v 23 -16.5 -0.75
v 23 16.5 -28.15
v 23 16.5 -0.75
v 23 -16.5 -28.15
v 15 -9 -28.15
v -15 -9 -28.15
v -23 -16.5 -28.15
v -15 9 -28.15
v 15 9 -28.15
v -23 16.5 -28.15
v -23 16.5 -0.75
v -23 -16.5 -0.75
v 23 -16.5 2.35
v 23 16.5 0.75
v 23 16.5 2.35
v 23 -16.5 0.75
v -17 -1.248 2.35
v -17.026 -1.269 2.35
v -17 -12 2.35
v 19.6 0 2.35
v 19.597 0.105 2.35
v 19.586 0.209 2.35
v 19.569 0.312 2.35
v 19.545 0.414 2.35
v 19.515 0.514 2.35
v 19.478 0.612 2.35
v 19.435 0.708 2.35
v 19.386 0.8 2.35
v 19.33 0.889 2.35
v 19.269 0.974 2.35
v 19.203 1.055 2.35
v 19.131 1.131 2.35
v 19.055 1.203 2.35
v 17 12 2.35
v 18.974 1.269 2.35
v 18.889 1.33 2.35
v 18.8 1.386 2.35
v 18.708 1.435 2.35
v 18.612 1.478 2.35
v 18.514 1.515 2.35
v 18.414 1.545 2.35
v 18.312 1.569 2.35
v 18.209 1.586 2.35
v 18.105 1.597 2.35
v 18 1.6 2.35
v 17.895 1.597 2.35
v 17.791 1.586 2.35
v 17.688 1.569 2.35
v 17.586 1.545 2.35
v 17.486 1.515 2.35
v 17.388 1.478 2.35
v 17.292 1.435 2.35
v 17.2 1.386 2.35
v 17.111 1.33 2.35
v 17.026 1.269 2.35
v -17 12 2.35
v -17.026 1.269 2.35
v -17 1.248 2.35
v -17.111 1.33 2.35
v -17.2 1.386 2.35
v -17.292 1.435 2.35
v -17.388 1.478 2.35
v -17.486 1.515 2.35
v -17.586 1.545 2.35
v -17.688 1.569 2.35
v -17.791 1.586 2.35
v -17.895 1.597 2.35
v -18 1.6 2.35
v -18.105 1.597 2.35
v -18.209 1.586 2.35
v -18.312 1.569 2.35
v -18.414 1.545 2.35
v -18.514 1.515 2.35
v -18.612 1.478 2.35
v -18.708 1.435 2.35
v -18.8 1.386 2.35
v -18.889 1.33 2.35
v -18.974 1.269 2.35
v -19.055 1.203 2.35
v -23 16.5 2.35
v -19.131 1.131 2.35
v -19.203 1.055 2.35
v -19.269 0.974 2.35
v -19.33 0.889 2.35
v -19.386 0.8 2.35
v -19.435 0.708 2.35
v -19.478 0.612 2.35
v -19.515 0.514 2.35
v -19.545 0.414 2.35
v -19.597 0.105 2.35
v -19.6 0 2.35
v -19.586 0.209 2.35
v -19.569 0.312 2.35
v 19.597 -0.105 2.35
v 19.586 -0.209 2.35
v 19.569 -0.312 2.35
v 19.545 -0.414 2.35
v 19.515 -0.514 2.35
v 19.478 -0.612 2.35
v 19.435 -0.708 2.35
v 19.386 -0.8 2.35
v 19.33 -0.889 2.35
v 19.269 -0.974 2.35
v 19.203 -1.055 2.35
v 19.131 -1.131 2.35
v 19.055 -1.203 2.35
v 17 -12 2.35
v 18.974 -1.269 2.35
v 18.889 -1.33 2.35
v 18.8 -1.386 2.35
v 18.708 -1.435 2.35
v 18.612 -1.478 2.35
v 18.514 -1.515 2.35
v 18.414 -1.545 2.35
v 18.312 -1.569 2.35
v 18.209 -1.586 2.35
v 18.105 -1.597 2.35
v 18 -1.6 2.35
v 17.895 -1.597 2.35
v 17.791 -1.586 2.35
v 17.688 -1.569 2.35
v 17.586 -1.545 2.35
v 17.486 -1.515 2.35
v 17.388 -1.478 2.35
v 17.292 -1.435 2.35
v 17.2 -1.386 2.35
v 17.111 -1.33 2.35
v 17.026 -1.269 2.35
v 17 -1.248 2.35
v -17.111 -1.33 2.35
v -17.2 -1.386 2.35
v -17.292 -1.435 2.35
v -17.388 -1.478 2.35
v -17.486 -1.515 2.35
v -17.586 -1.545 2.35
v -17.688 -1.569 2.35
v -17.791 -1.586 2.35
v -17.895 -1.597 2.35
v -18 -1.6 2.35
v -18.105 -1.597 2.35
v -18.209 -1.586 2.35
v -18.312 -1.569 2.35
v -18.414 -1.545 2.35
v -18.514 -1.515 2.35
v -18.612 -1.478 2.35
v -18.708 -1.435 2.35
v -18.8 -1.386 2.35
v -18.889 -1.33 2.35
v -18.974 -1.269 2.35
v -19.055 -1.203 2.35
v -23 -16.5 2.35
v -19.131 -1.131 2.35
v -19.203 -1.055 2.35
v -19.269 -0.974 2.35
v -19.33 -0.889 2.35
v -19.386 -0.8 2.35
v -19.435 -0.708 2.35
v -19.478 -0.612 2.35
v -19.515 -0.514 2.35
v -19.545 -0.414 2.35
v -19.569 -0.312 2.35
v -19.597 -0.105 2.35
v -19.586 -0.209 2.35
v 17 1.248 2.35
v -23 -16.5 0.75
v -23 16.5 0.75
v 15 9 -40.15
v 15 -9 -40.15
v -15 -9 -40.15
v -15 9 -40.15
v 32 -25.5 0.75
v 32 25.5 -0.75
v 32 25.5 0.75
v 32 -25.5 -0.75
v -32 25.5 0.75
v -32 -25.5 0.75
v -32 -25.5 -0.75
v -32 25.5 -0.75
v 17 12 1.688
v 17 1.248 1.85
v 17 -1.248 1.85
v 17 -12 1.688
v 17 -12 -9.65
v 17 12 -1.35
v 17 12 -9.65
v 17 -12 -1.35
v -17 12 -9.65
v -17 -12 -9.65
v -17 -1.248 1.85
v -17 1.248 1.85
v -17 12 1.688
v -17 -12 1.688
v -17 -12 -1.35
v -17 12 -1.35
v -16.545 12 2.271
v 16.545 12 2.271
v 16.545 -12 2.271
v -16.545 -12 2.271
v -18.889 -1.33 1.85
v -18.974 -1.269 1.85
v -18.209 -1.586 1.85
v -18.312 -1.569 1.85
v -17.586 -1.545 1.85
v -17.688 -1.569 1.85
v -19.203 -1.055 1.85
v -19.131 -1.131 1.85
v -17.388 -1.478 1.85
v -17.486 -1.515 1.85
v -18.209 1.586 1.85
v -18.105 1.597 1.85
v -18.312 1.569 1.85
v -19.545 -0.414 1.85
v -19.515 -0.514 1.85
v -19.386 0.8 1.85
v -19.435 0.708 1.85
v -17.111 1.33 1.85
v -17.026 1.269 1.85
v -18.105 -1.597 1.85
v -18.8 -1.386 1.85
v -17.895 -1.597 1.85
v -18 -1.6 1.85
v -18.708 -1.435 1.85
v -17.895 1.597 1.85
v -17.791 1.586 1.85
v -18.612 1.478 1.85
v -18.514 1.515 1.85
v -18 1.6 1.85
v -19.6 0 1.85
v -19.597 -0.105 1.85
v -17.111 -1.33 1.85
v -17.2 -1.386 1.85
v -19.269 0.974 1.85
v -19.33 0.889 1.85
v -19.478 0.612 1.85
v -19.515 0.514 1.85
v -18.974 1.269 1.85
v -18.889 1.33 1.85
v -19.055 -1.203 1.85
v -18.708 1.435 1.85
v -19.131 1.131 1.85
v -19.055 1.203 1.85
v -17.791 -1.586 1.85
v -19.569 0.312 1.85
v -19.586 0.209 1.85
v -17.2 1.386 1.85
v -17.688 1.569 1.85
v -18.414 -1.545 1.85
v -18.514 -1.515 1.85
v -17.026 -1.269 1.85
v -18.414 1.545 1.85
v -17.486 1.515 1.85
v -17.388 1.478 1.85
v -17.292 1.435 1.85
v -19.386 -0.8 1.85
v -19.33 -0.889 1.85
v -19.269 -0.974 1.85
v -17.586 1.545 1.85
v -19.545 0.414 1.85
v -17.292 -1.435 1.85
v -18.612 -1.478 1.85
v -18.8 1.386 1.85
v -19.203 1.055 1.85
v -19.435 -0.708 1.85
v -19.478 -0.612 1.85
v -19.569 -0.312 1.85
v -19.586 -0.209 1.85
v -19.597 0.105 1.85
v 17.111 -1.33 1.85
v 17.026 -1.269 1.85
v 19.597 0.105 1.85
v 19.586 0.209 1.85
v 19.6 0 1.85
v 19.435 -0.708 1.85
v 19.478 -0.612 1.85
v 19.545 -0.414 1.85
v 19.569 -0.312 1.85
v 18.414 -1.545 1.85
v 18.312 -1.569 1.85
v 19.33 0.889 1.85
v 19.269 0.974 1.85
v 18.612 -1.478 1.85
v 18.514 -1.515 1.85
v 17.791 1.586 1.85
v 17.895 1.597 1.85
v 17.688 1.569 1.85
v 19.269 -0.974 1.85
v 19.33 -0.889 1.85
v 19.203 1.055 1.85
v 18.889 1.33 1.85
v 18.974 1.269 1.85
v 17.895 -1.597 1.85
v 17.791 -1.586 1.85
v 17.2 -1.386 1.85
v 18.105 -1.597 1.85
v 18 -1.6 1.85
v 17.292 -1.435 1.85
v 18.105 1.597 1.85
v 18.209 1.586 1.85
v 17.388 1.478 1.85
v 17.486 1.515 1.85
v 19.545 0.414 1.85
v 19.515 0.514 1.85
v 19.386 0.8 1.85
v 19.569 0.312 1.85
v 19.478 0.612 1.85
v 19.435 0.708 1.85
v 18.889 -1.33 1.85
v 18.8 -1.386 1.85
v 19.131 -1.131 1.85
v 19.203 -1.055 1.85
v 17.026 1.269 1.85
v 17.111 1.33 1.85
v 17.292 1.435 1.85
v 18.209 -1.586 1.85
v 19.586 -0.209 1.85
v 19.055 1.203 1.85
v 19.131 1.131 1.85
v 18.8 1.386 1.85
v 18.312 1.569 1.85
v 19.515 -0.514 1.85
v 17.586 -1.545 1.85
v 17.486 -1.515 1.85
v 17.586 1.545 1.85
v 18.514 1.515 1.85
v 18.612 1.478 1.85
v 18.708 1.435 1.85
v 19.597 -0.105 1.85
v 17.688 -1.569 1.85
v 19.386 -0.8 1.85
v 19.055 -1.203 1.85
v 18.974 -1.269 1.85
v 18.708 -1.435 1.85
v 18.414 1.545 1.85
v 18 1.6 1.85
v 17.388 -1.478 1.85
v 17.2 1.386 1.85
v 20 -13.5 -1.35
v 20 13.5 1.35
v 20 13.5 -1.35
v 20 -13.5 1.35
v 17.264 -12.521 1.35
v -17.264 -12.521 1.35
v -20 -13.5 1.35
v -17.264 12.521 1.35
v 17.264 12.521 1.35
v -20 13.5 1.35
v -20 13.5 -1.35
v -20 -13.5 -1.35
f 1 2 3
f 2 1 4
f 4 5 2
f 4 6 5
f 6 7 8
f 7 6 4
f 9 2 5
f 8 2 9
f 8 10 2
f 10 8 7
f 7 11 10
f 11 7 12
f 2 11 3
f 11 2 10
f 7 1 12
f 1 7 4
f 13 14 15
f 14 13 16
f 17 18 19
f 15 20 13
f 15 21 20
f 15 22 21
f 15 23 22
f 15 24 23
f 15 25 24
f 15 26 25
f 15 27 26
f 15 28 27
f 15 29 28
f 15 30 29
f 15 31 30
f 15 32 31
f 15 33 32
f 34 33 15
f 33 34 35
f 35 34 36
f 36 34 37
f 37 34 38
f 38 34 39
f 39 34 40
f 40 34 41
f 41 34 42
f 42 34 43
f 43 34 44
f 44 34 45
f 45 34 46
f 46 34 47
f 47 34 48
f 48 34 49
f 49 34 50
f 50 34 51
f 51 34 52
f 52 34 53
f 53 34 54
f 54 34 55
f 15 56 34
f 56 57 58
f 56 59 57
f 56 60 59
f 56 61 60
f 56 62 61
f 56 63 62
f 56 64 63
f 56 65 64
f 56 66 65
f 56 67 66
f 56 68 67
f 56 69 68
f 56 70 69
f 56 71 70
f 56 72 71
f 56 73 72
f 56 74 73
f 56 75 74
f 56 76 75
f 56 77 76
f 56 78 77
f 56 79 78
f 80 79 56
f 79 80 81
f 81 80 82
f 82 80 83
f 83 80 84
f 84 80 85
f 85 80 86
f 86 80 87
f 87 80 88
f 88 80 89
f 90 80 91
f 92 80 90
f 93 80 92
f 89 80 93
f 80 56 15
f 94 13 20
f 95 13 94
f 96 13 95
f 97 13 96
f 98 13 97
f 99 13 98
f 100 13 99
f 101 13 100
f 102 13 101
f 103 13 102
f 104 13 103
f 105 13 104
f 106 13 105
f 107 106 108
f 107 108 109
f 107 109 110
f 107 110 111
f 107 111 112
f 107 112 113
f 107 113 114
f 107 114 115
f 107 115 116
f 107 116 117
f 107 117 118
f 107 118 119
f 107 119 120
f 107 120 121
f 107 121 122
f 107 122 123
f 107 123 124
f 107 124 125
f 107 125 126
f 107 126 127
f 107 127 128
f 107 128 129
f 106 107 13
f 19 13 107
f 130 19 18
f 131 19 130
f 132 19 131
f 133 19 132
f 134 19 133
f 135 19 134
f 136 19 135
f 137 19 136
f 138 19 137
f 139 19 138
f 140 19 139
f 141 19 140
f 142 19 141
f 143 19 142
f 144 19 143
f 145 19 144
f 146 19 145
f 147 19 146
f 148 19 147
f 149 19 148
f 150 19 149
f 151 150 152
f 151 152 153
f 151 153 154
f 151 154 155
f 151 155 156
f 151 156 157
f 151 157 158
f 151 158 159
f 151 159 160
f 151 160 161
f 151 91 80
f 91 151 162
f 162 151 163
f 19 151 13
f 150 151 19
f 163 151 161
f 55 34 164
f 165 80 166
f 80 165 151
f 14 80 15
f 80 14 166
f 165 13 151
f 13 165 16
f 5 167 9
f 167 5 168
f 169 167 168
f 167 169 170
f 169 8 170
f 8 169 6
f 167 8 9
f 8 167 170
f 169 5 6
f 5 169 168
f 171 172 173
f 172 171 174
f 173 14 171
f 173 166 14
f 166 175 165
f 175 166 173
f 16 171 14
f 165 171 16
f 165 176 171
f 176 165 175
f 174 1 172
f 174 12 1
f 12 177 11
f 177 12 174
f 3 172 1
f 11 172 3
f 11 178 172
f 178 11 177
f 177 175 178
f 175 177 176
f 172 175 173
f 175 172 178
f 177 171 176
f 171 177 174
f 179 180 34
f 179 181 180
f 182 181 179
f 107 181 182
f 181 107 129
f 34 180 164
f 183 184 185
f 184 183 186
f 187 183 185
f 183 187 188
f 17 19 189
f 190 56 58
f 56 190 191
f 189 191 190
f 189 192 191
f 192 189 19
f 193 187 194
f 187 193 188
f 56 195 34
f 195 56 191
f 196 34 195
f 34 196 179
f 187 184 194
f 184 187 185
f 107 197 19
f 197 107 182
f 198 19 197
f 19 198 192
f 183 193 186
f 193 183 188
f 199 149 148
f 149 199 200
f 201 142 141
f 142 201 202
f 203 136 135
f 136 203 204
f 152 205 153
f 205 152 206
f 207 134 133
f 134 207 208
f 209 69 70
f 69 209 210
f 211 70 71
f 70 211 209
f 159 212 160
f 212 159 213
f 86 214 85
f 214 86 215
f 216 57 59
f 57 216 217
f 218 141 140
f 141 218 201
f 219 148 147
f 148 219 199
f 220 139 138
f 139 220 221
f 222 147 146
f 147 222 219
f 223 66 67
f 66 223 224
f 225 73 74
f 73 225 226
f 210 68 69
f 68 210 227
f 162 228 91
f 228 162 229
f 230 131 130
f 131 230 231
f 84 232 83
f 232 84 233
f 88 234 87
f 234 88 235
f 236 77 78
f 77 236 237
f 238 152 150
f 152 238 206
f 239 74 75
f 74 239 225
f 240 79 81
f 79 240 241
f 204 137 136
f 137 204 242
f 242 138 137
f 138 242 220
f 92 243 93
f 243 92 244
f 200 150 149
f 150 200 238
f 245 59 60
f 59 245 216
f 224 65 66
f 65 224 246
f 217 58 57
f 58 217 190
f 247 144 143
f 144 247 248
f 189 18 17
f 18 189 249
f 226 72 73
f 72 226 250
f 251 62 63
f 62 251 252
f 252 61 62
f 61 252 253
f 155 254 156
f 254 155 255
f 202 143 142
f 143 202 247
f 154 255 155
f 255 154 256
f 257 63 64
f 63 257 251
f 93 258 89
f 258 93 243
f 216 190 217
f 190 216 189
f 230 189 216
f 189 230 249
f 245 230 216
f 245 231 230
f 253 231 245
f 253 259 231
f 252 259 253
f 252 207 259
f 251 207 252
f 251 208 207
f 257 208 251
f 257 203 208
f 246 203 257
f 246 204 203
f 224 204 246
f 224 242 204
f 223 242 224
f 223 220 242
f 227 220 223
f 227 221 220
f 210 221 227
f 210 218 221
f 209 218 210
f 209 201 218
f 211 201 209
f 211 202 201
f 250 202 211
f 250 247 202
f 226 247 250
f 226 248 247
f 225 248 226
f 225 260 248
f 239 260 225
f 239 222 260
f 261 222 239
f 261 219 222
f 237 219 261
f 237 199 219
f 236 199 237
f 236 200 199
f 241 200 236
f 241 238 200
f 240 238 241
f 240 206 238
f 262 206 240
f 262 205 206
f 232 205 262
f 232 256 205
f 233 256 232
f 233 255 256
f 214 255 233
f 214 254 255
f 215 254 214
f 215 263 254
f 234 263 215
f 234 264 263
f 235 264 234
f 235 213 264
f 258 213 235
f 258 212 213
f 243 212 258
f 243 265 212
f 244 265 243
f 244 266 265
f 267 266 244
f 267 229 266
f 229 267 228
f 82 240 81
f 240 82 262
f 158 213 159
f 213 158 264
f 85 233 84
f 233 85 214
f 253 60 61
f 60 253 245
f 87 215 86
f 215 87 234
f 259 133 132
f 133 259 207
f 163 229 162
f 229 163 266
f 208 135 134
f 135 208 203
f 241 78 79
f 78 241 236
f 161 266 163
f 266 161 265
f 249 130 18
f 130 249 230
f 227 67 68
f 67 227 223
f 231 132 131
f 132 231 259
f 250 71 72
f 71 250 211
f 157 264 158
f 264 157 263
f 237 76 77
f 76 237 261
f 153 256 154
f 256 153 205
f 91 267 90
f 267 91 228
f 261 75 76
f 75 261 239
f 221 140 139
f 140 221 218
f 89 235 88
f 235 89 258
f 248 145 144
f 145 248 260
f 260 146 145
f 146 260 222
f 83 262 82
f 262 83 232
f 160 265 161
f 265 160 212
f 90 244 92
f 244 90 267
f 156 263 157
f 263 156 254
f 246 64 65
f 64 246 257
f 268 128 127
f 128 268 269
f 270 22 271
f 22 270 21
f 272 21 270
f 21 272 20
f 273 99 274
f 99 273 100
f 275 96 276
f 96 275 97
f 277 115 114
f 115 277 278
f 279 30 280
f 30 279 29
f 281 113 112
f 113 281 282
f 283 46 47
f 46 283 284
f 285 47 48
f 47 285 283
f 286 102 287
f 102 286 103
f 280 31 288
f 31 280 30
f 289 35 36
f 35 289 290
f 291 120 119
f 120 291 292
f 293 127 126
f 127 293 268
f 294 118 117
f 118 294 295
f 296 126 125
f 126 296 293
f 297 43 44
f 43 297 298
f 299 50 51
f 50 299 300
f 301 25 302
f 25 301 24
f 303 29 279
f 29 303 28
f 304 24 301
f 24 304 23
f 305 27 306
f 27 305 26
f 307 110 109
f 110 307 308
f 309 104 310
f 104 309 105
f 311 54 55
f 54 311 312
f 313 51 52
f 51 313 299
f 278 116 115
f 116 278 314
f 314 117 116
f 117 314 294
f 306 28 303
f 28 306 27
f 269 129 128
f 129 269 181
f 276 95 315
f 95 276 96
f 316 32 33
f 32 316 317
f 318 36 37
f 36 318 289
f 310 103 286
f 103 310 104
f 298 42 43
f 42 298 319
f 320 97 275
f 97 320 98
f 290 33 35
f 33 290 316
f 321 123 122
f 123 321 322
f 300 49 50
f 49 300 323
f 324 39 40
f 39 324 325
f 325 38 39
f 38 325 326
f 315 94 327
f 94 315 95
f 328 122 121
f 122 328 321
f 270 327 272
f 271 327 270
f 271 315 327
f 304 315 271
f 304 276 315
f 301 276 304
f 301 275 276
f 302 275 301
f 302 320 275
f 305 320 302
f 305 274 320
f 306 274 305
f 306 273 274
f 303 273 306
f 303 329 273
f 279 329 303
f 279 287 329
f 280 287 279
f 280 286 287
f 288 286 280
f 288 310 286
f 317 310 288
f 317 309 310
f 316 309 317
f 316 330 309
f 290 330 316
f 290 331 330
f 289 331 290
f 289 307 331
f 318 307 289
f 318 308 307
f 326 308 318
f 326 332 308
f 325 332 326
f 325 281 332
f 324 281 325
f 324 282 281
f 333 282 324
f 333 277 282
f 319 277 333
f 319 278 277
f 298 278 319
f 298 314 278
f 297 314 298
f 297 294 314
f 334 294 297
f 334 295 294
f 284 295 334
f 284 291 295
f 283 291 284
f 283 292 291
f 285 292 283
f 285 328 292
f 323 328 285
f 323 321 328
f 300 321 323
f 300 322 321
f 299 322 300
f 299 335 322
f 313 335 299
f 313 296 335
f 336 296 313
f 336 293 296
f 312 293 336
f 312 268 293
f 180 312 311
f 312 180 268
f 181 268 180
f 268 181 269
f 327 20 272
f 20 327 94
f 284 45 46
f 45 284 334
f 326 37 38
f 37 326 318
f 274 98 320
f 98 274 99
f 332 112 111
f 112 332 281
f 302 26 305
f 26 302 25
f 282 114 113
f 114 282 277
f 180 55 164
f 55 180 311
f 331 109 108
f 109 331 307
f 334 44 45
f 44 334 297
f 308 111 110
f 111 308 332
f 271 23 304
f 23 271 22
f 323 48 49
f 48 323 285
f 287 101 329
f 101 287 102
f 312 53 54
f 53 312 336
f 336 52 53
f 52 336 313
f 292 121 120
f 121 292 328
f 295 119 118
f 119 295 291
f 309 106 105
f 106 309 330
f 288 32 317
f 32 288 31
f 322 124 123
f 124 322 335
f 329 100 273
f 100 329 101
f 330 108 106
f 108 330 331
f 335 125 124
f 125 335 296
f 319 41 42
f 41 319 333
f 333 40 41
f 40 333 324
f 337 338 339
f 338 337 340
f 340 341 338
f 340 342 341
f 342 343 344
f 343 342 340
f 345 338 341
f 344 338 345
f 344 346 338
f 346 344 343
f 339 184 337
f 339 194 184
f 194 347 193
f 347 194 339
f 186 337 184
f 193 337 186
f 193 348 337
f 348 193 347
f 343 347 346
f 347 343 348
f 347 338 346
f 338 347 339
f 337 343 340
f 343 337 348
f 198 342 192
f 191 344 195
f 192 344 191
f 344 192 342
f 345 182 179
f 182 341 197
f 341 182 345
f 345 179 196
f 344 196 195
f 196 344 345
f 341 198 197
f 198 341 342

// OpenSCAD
$fn = 96;

// IEC C14 inlet module (ATX style) with panel cutout 40.0mm x 27.0mm
cutout_width  = 40.0;
cutout_height = 27.0;

// Panel (kept as part of ONE connected solid)
panel_thickness = 1.5;
panel_margin    = 12.0;

// IEC body behind panel
iec_body_depth   = 28.0;
iec_body_extra_w = 6.0;
iec_body_extra_h = 6.0;

// Front bezel / flange
bezel_thickness = 2.2;
bezel_overhang  = 3.0;   // per side beyond cutout
bezel_chamfer   = 1.2;   // chamfer size (visual)

// Inlet cavity + features (approximate IEC C14 look)
inlet_face_w = 34.0;
inlet_face_h = 24.0;
inlet_depth  = 12.0;     // deeper so it reads as a socket

// Inner "throat" step (gives recognizable C14 recessed shape)
throat_w     = 30.0;
throat_h     = 20.0;
throat_depth = 8.0;

// Pin openings (approx)
pin_slot_w       = 6.2;
pin_slot_h       = 3.2;
pin_slot_pitch_x = 14.0; // L-N spacing

earth_w = 4.2;
earth_h = 3.2;

// Positioning of pins within inlet opening (from top edge of inlet opening)
pin_z_from_top   = 7.0;
earth_z_from_top = 16.0;

// Side latch notches (visual)
latch_notch_w     = 2.2;
latch_notch_h     = 7.0;
latch_notch_depth = 3.2;

// Optional rear module block (kept connected)
mod_block_w = 30.0;
mod_block_h = 18.0;
mod_block_d = 12.0;
mod_offset_y = 0.0;

// Screw dimples (front)
screw_hole_diameter = 3.2;
screw_hole_pitch_x  = 36.0;
screw_dimple_depth  = 0.8;

// Small overlap to guarantee connectivity / avoid coplanar artifacts
overlap = 0.6;

module panel_solid(){
    cube([cutout_width + 2*panel_margin,
          cutout_height + 2*panel_margin,
          panel_thickness], center=true);
}

module bezel_and_body(){
    // Panel centered at z=0. Front is +Z, back is -Z.
    union(){
        // Rear body (connected through overlap into panel)
        translate([0,0, -(panel_thickness/2 + iec_body_depth/2 - overlap)])
            cube([cutout_width + iec_body_extra_w,
                  cutout_height + iec_body_extra_h,
                  iec_body_depth], center=true);

        // Front bezel (flange)
        translate([0,0, +(panel_thickness/2 + bezel_thickness/2 - overlap)])
            cube([cutout_width + 2*bezel_overhang,
                  cutout_height + 2*bezel_overhang,
                  bezel_thickness], center=true);

        // Rear module block (connected to rear body)
        translate([0, mod_offset_y,
                   -(panel_thickness/2 + iec_body_depth - overlap + mod_block_d/2)])
            cube([mod_block_w, mod_block_h, mod_block_d], center=true);
    }
}

module panel_cutout_void(){
    // Panel cutout (40x27) only through panel thickness
    cube([cutout_width, cutout_height, panel_thickness + 2*overlap], center=true);
}

module inlet_cavity(){
    // Main inlet cavity starts just inside the front bezel and goes inward
    z_start = panel_thickness/2 + bezel_thickness - overlap; // just behind front face
    translate([0,0, z_start - inlet_depth/2])
        cube([inlet_face_w, inlet_face_h, inlet_depth], center=true);

    // Inner throat step (deeper, smaller rectangle) to resemble C14 recess
    translate([0,0, z_start - throat_depth/2 - (inlet_depth - throat_depth) + overlap])
        cube([throat_w, throat_h, throat_depth + overlap], center=true);
}

module inlet_rim_chamfer(){
    // Beveled rim: subtract a tapered frustum-like cut at the very front
    // Use linear_extrude with scale to create a chamfered entrance.
    z_front_center = panel_thickness/2 + bezel_thickness/2 - overlap/2;
    translate([0,0, z_front_center])
        linear_extrude(height=bezel_thickness + overlap, center=true, scale=0.88)
            square([inlet_face_w + 2*bezel_chamfer,
                    inlet_face_h + 2*bezel_chamfer], center=true);
}

module pin_openings(){
    // Cut pin slots into the back wall of the inlet cavity (not through entire body)
    z_start = panel_thickness/2 + bezel_thickness - overlap;

    // Place pins near the back of the inlet cavity so they read as openings
    pin_depth = inlet_depth * 0.55;
    z_pin_center = z_start - inlet_depth + pin_depth/2 + overlap;

    y_pin = (inlet_face_h/2 - pin_z_from_top);
    y_earth = (inlet_face_h/2 - earth_z_from_top);

    // L and N
    for (sx = [-pin_slot_pitch_x/2, pin_slot_pitch_x/2]){
        translate([sx, y_pin, z_pin_center])
            cube([pin_slot_w, pin_slot_h, pin_depth + 2*overlap], center=true);
    }

    // Earth (center, lower)
    translate([0, y_earth, z_pin_center])
        cube([earth_w, earth_h, pin_depth + 2*overlap], center=true);
}

module latch_notches(){
    // Side latch notches inside inlet cavity (visual)
    z_start = panel_thickness/2 + bezel_thickness - overlap;

    nd = latch_notch_depth;
    z_notch_center = z_start - nd/2 - overlap;

    // Put notches roughly mid-height of inlet opening
    y0 = 0;

    translate([0,0, z_notch_center]){
        for (sx = [-1, 1]){
            translate([sx*(inlet_face_w/2 - latch_notch_w/2), y0, 0])
                cube([latch_notch_w, latch_notch_h, nd + 2*overlap], center=true);
        }
    }
}

module screw_dimples(){
    // Shallow dimples on front bezel (do NOT go through -> keeps one solid)
    z_dimple_center = panel_thickness/2 + bezel_thickness - screw_dimple_depth/2;
    for (sx = [-screw_hole_pitch_x/2, screw_hole_pitch_x/2]){
        translate([sx, 0, z_dimple_center])
            cylinder(d=screw_hole_diameter, h=screw_dimple_depth + overlap, center=true);
    }
}

module iec_inlet_module(){
    difference(){
        // One connected solid base
        union(){
            panel_solid();
            bezel_and_body();
        }

        // Cut features
        panel_cutout_void();
        inlet_cavity();
        inlet_rim_chamfer();
        pin_openings();
        latch_notches();
        screw_dimples();
    }
}

iec_inlet_module();
